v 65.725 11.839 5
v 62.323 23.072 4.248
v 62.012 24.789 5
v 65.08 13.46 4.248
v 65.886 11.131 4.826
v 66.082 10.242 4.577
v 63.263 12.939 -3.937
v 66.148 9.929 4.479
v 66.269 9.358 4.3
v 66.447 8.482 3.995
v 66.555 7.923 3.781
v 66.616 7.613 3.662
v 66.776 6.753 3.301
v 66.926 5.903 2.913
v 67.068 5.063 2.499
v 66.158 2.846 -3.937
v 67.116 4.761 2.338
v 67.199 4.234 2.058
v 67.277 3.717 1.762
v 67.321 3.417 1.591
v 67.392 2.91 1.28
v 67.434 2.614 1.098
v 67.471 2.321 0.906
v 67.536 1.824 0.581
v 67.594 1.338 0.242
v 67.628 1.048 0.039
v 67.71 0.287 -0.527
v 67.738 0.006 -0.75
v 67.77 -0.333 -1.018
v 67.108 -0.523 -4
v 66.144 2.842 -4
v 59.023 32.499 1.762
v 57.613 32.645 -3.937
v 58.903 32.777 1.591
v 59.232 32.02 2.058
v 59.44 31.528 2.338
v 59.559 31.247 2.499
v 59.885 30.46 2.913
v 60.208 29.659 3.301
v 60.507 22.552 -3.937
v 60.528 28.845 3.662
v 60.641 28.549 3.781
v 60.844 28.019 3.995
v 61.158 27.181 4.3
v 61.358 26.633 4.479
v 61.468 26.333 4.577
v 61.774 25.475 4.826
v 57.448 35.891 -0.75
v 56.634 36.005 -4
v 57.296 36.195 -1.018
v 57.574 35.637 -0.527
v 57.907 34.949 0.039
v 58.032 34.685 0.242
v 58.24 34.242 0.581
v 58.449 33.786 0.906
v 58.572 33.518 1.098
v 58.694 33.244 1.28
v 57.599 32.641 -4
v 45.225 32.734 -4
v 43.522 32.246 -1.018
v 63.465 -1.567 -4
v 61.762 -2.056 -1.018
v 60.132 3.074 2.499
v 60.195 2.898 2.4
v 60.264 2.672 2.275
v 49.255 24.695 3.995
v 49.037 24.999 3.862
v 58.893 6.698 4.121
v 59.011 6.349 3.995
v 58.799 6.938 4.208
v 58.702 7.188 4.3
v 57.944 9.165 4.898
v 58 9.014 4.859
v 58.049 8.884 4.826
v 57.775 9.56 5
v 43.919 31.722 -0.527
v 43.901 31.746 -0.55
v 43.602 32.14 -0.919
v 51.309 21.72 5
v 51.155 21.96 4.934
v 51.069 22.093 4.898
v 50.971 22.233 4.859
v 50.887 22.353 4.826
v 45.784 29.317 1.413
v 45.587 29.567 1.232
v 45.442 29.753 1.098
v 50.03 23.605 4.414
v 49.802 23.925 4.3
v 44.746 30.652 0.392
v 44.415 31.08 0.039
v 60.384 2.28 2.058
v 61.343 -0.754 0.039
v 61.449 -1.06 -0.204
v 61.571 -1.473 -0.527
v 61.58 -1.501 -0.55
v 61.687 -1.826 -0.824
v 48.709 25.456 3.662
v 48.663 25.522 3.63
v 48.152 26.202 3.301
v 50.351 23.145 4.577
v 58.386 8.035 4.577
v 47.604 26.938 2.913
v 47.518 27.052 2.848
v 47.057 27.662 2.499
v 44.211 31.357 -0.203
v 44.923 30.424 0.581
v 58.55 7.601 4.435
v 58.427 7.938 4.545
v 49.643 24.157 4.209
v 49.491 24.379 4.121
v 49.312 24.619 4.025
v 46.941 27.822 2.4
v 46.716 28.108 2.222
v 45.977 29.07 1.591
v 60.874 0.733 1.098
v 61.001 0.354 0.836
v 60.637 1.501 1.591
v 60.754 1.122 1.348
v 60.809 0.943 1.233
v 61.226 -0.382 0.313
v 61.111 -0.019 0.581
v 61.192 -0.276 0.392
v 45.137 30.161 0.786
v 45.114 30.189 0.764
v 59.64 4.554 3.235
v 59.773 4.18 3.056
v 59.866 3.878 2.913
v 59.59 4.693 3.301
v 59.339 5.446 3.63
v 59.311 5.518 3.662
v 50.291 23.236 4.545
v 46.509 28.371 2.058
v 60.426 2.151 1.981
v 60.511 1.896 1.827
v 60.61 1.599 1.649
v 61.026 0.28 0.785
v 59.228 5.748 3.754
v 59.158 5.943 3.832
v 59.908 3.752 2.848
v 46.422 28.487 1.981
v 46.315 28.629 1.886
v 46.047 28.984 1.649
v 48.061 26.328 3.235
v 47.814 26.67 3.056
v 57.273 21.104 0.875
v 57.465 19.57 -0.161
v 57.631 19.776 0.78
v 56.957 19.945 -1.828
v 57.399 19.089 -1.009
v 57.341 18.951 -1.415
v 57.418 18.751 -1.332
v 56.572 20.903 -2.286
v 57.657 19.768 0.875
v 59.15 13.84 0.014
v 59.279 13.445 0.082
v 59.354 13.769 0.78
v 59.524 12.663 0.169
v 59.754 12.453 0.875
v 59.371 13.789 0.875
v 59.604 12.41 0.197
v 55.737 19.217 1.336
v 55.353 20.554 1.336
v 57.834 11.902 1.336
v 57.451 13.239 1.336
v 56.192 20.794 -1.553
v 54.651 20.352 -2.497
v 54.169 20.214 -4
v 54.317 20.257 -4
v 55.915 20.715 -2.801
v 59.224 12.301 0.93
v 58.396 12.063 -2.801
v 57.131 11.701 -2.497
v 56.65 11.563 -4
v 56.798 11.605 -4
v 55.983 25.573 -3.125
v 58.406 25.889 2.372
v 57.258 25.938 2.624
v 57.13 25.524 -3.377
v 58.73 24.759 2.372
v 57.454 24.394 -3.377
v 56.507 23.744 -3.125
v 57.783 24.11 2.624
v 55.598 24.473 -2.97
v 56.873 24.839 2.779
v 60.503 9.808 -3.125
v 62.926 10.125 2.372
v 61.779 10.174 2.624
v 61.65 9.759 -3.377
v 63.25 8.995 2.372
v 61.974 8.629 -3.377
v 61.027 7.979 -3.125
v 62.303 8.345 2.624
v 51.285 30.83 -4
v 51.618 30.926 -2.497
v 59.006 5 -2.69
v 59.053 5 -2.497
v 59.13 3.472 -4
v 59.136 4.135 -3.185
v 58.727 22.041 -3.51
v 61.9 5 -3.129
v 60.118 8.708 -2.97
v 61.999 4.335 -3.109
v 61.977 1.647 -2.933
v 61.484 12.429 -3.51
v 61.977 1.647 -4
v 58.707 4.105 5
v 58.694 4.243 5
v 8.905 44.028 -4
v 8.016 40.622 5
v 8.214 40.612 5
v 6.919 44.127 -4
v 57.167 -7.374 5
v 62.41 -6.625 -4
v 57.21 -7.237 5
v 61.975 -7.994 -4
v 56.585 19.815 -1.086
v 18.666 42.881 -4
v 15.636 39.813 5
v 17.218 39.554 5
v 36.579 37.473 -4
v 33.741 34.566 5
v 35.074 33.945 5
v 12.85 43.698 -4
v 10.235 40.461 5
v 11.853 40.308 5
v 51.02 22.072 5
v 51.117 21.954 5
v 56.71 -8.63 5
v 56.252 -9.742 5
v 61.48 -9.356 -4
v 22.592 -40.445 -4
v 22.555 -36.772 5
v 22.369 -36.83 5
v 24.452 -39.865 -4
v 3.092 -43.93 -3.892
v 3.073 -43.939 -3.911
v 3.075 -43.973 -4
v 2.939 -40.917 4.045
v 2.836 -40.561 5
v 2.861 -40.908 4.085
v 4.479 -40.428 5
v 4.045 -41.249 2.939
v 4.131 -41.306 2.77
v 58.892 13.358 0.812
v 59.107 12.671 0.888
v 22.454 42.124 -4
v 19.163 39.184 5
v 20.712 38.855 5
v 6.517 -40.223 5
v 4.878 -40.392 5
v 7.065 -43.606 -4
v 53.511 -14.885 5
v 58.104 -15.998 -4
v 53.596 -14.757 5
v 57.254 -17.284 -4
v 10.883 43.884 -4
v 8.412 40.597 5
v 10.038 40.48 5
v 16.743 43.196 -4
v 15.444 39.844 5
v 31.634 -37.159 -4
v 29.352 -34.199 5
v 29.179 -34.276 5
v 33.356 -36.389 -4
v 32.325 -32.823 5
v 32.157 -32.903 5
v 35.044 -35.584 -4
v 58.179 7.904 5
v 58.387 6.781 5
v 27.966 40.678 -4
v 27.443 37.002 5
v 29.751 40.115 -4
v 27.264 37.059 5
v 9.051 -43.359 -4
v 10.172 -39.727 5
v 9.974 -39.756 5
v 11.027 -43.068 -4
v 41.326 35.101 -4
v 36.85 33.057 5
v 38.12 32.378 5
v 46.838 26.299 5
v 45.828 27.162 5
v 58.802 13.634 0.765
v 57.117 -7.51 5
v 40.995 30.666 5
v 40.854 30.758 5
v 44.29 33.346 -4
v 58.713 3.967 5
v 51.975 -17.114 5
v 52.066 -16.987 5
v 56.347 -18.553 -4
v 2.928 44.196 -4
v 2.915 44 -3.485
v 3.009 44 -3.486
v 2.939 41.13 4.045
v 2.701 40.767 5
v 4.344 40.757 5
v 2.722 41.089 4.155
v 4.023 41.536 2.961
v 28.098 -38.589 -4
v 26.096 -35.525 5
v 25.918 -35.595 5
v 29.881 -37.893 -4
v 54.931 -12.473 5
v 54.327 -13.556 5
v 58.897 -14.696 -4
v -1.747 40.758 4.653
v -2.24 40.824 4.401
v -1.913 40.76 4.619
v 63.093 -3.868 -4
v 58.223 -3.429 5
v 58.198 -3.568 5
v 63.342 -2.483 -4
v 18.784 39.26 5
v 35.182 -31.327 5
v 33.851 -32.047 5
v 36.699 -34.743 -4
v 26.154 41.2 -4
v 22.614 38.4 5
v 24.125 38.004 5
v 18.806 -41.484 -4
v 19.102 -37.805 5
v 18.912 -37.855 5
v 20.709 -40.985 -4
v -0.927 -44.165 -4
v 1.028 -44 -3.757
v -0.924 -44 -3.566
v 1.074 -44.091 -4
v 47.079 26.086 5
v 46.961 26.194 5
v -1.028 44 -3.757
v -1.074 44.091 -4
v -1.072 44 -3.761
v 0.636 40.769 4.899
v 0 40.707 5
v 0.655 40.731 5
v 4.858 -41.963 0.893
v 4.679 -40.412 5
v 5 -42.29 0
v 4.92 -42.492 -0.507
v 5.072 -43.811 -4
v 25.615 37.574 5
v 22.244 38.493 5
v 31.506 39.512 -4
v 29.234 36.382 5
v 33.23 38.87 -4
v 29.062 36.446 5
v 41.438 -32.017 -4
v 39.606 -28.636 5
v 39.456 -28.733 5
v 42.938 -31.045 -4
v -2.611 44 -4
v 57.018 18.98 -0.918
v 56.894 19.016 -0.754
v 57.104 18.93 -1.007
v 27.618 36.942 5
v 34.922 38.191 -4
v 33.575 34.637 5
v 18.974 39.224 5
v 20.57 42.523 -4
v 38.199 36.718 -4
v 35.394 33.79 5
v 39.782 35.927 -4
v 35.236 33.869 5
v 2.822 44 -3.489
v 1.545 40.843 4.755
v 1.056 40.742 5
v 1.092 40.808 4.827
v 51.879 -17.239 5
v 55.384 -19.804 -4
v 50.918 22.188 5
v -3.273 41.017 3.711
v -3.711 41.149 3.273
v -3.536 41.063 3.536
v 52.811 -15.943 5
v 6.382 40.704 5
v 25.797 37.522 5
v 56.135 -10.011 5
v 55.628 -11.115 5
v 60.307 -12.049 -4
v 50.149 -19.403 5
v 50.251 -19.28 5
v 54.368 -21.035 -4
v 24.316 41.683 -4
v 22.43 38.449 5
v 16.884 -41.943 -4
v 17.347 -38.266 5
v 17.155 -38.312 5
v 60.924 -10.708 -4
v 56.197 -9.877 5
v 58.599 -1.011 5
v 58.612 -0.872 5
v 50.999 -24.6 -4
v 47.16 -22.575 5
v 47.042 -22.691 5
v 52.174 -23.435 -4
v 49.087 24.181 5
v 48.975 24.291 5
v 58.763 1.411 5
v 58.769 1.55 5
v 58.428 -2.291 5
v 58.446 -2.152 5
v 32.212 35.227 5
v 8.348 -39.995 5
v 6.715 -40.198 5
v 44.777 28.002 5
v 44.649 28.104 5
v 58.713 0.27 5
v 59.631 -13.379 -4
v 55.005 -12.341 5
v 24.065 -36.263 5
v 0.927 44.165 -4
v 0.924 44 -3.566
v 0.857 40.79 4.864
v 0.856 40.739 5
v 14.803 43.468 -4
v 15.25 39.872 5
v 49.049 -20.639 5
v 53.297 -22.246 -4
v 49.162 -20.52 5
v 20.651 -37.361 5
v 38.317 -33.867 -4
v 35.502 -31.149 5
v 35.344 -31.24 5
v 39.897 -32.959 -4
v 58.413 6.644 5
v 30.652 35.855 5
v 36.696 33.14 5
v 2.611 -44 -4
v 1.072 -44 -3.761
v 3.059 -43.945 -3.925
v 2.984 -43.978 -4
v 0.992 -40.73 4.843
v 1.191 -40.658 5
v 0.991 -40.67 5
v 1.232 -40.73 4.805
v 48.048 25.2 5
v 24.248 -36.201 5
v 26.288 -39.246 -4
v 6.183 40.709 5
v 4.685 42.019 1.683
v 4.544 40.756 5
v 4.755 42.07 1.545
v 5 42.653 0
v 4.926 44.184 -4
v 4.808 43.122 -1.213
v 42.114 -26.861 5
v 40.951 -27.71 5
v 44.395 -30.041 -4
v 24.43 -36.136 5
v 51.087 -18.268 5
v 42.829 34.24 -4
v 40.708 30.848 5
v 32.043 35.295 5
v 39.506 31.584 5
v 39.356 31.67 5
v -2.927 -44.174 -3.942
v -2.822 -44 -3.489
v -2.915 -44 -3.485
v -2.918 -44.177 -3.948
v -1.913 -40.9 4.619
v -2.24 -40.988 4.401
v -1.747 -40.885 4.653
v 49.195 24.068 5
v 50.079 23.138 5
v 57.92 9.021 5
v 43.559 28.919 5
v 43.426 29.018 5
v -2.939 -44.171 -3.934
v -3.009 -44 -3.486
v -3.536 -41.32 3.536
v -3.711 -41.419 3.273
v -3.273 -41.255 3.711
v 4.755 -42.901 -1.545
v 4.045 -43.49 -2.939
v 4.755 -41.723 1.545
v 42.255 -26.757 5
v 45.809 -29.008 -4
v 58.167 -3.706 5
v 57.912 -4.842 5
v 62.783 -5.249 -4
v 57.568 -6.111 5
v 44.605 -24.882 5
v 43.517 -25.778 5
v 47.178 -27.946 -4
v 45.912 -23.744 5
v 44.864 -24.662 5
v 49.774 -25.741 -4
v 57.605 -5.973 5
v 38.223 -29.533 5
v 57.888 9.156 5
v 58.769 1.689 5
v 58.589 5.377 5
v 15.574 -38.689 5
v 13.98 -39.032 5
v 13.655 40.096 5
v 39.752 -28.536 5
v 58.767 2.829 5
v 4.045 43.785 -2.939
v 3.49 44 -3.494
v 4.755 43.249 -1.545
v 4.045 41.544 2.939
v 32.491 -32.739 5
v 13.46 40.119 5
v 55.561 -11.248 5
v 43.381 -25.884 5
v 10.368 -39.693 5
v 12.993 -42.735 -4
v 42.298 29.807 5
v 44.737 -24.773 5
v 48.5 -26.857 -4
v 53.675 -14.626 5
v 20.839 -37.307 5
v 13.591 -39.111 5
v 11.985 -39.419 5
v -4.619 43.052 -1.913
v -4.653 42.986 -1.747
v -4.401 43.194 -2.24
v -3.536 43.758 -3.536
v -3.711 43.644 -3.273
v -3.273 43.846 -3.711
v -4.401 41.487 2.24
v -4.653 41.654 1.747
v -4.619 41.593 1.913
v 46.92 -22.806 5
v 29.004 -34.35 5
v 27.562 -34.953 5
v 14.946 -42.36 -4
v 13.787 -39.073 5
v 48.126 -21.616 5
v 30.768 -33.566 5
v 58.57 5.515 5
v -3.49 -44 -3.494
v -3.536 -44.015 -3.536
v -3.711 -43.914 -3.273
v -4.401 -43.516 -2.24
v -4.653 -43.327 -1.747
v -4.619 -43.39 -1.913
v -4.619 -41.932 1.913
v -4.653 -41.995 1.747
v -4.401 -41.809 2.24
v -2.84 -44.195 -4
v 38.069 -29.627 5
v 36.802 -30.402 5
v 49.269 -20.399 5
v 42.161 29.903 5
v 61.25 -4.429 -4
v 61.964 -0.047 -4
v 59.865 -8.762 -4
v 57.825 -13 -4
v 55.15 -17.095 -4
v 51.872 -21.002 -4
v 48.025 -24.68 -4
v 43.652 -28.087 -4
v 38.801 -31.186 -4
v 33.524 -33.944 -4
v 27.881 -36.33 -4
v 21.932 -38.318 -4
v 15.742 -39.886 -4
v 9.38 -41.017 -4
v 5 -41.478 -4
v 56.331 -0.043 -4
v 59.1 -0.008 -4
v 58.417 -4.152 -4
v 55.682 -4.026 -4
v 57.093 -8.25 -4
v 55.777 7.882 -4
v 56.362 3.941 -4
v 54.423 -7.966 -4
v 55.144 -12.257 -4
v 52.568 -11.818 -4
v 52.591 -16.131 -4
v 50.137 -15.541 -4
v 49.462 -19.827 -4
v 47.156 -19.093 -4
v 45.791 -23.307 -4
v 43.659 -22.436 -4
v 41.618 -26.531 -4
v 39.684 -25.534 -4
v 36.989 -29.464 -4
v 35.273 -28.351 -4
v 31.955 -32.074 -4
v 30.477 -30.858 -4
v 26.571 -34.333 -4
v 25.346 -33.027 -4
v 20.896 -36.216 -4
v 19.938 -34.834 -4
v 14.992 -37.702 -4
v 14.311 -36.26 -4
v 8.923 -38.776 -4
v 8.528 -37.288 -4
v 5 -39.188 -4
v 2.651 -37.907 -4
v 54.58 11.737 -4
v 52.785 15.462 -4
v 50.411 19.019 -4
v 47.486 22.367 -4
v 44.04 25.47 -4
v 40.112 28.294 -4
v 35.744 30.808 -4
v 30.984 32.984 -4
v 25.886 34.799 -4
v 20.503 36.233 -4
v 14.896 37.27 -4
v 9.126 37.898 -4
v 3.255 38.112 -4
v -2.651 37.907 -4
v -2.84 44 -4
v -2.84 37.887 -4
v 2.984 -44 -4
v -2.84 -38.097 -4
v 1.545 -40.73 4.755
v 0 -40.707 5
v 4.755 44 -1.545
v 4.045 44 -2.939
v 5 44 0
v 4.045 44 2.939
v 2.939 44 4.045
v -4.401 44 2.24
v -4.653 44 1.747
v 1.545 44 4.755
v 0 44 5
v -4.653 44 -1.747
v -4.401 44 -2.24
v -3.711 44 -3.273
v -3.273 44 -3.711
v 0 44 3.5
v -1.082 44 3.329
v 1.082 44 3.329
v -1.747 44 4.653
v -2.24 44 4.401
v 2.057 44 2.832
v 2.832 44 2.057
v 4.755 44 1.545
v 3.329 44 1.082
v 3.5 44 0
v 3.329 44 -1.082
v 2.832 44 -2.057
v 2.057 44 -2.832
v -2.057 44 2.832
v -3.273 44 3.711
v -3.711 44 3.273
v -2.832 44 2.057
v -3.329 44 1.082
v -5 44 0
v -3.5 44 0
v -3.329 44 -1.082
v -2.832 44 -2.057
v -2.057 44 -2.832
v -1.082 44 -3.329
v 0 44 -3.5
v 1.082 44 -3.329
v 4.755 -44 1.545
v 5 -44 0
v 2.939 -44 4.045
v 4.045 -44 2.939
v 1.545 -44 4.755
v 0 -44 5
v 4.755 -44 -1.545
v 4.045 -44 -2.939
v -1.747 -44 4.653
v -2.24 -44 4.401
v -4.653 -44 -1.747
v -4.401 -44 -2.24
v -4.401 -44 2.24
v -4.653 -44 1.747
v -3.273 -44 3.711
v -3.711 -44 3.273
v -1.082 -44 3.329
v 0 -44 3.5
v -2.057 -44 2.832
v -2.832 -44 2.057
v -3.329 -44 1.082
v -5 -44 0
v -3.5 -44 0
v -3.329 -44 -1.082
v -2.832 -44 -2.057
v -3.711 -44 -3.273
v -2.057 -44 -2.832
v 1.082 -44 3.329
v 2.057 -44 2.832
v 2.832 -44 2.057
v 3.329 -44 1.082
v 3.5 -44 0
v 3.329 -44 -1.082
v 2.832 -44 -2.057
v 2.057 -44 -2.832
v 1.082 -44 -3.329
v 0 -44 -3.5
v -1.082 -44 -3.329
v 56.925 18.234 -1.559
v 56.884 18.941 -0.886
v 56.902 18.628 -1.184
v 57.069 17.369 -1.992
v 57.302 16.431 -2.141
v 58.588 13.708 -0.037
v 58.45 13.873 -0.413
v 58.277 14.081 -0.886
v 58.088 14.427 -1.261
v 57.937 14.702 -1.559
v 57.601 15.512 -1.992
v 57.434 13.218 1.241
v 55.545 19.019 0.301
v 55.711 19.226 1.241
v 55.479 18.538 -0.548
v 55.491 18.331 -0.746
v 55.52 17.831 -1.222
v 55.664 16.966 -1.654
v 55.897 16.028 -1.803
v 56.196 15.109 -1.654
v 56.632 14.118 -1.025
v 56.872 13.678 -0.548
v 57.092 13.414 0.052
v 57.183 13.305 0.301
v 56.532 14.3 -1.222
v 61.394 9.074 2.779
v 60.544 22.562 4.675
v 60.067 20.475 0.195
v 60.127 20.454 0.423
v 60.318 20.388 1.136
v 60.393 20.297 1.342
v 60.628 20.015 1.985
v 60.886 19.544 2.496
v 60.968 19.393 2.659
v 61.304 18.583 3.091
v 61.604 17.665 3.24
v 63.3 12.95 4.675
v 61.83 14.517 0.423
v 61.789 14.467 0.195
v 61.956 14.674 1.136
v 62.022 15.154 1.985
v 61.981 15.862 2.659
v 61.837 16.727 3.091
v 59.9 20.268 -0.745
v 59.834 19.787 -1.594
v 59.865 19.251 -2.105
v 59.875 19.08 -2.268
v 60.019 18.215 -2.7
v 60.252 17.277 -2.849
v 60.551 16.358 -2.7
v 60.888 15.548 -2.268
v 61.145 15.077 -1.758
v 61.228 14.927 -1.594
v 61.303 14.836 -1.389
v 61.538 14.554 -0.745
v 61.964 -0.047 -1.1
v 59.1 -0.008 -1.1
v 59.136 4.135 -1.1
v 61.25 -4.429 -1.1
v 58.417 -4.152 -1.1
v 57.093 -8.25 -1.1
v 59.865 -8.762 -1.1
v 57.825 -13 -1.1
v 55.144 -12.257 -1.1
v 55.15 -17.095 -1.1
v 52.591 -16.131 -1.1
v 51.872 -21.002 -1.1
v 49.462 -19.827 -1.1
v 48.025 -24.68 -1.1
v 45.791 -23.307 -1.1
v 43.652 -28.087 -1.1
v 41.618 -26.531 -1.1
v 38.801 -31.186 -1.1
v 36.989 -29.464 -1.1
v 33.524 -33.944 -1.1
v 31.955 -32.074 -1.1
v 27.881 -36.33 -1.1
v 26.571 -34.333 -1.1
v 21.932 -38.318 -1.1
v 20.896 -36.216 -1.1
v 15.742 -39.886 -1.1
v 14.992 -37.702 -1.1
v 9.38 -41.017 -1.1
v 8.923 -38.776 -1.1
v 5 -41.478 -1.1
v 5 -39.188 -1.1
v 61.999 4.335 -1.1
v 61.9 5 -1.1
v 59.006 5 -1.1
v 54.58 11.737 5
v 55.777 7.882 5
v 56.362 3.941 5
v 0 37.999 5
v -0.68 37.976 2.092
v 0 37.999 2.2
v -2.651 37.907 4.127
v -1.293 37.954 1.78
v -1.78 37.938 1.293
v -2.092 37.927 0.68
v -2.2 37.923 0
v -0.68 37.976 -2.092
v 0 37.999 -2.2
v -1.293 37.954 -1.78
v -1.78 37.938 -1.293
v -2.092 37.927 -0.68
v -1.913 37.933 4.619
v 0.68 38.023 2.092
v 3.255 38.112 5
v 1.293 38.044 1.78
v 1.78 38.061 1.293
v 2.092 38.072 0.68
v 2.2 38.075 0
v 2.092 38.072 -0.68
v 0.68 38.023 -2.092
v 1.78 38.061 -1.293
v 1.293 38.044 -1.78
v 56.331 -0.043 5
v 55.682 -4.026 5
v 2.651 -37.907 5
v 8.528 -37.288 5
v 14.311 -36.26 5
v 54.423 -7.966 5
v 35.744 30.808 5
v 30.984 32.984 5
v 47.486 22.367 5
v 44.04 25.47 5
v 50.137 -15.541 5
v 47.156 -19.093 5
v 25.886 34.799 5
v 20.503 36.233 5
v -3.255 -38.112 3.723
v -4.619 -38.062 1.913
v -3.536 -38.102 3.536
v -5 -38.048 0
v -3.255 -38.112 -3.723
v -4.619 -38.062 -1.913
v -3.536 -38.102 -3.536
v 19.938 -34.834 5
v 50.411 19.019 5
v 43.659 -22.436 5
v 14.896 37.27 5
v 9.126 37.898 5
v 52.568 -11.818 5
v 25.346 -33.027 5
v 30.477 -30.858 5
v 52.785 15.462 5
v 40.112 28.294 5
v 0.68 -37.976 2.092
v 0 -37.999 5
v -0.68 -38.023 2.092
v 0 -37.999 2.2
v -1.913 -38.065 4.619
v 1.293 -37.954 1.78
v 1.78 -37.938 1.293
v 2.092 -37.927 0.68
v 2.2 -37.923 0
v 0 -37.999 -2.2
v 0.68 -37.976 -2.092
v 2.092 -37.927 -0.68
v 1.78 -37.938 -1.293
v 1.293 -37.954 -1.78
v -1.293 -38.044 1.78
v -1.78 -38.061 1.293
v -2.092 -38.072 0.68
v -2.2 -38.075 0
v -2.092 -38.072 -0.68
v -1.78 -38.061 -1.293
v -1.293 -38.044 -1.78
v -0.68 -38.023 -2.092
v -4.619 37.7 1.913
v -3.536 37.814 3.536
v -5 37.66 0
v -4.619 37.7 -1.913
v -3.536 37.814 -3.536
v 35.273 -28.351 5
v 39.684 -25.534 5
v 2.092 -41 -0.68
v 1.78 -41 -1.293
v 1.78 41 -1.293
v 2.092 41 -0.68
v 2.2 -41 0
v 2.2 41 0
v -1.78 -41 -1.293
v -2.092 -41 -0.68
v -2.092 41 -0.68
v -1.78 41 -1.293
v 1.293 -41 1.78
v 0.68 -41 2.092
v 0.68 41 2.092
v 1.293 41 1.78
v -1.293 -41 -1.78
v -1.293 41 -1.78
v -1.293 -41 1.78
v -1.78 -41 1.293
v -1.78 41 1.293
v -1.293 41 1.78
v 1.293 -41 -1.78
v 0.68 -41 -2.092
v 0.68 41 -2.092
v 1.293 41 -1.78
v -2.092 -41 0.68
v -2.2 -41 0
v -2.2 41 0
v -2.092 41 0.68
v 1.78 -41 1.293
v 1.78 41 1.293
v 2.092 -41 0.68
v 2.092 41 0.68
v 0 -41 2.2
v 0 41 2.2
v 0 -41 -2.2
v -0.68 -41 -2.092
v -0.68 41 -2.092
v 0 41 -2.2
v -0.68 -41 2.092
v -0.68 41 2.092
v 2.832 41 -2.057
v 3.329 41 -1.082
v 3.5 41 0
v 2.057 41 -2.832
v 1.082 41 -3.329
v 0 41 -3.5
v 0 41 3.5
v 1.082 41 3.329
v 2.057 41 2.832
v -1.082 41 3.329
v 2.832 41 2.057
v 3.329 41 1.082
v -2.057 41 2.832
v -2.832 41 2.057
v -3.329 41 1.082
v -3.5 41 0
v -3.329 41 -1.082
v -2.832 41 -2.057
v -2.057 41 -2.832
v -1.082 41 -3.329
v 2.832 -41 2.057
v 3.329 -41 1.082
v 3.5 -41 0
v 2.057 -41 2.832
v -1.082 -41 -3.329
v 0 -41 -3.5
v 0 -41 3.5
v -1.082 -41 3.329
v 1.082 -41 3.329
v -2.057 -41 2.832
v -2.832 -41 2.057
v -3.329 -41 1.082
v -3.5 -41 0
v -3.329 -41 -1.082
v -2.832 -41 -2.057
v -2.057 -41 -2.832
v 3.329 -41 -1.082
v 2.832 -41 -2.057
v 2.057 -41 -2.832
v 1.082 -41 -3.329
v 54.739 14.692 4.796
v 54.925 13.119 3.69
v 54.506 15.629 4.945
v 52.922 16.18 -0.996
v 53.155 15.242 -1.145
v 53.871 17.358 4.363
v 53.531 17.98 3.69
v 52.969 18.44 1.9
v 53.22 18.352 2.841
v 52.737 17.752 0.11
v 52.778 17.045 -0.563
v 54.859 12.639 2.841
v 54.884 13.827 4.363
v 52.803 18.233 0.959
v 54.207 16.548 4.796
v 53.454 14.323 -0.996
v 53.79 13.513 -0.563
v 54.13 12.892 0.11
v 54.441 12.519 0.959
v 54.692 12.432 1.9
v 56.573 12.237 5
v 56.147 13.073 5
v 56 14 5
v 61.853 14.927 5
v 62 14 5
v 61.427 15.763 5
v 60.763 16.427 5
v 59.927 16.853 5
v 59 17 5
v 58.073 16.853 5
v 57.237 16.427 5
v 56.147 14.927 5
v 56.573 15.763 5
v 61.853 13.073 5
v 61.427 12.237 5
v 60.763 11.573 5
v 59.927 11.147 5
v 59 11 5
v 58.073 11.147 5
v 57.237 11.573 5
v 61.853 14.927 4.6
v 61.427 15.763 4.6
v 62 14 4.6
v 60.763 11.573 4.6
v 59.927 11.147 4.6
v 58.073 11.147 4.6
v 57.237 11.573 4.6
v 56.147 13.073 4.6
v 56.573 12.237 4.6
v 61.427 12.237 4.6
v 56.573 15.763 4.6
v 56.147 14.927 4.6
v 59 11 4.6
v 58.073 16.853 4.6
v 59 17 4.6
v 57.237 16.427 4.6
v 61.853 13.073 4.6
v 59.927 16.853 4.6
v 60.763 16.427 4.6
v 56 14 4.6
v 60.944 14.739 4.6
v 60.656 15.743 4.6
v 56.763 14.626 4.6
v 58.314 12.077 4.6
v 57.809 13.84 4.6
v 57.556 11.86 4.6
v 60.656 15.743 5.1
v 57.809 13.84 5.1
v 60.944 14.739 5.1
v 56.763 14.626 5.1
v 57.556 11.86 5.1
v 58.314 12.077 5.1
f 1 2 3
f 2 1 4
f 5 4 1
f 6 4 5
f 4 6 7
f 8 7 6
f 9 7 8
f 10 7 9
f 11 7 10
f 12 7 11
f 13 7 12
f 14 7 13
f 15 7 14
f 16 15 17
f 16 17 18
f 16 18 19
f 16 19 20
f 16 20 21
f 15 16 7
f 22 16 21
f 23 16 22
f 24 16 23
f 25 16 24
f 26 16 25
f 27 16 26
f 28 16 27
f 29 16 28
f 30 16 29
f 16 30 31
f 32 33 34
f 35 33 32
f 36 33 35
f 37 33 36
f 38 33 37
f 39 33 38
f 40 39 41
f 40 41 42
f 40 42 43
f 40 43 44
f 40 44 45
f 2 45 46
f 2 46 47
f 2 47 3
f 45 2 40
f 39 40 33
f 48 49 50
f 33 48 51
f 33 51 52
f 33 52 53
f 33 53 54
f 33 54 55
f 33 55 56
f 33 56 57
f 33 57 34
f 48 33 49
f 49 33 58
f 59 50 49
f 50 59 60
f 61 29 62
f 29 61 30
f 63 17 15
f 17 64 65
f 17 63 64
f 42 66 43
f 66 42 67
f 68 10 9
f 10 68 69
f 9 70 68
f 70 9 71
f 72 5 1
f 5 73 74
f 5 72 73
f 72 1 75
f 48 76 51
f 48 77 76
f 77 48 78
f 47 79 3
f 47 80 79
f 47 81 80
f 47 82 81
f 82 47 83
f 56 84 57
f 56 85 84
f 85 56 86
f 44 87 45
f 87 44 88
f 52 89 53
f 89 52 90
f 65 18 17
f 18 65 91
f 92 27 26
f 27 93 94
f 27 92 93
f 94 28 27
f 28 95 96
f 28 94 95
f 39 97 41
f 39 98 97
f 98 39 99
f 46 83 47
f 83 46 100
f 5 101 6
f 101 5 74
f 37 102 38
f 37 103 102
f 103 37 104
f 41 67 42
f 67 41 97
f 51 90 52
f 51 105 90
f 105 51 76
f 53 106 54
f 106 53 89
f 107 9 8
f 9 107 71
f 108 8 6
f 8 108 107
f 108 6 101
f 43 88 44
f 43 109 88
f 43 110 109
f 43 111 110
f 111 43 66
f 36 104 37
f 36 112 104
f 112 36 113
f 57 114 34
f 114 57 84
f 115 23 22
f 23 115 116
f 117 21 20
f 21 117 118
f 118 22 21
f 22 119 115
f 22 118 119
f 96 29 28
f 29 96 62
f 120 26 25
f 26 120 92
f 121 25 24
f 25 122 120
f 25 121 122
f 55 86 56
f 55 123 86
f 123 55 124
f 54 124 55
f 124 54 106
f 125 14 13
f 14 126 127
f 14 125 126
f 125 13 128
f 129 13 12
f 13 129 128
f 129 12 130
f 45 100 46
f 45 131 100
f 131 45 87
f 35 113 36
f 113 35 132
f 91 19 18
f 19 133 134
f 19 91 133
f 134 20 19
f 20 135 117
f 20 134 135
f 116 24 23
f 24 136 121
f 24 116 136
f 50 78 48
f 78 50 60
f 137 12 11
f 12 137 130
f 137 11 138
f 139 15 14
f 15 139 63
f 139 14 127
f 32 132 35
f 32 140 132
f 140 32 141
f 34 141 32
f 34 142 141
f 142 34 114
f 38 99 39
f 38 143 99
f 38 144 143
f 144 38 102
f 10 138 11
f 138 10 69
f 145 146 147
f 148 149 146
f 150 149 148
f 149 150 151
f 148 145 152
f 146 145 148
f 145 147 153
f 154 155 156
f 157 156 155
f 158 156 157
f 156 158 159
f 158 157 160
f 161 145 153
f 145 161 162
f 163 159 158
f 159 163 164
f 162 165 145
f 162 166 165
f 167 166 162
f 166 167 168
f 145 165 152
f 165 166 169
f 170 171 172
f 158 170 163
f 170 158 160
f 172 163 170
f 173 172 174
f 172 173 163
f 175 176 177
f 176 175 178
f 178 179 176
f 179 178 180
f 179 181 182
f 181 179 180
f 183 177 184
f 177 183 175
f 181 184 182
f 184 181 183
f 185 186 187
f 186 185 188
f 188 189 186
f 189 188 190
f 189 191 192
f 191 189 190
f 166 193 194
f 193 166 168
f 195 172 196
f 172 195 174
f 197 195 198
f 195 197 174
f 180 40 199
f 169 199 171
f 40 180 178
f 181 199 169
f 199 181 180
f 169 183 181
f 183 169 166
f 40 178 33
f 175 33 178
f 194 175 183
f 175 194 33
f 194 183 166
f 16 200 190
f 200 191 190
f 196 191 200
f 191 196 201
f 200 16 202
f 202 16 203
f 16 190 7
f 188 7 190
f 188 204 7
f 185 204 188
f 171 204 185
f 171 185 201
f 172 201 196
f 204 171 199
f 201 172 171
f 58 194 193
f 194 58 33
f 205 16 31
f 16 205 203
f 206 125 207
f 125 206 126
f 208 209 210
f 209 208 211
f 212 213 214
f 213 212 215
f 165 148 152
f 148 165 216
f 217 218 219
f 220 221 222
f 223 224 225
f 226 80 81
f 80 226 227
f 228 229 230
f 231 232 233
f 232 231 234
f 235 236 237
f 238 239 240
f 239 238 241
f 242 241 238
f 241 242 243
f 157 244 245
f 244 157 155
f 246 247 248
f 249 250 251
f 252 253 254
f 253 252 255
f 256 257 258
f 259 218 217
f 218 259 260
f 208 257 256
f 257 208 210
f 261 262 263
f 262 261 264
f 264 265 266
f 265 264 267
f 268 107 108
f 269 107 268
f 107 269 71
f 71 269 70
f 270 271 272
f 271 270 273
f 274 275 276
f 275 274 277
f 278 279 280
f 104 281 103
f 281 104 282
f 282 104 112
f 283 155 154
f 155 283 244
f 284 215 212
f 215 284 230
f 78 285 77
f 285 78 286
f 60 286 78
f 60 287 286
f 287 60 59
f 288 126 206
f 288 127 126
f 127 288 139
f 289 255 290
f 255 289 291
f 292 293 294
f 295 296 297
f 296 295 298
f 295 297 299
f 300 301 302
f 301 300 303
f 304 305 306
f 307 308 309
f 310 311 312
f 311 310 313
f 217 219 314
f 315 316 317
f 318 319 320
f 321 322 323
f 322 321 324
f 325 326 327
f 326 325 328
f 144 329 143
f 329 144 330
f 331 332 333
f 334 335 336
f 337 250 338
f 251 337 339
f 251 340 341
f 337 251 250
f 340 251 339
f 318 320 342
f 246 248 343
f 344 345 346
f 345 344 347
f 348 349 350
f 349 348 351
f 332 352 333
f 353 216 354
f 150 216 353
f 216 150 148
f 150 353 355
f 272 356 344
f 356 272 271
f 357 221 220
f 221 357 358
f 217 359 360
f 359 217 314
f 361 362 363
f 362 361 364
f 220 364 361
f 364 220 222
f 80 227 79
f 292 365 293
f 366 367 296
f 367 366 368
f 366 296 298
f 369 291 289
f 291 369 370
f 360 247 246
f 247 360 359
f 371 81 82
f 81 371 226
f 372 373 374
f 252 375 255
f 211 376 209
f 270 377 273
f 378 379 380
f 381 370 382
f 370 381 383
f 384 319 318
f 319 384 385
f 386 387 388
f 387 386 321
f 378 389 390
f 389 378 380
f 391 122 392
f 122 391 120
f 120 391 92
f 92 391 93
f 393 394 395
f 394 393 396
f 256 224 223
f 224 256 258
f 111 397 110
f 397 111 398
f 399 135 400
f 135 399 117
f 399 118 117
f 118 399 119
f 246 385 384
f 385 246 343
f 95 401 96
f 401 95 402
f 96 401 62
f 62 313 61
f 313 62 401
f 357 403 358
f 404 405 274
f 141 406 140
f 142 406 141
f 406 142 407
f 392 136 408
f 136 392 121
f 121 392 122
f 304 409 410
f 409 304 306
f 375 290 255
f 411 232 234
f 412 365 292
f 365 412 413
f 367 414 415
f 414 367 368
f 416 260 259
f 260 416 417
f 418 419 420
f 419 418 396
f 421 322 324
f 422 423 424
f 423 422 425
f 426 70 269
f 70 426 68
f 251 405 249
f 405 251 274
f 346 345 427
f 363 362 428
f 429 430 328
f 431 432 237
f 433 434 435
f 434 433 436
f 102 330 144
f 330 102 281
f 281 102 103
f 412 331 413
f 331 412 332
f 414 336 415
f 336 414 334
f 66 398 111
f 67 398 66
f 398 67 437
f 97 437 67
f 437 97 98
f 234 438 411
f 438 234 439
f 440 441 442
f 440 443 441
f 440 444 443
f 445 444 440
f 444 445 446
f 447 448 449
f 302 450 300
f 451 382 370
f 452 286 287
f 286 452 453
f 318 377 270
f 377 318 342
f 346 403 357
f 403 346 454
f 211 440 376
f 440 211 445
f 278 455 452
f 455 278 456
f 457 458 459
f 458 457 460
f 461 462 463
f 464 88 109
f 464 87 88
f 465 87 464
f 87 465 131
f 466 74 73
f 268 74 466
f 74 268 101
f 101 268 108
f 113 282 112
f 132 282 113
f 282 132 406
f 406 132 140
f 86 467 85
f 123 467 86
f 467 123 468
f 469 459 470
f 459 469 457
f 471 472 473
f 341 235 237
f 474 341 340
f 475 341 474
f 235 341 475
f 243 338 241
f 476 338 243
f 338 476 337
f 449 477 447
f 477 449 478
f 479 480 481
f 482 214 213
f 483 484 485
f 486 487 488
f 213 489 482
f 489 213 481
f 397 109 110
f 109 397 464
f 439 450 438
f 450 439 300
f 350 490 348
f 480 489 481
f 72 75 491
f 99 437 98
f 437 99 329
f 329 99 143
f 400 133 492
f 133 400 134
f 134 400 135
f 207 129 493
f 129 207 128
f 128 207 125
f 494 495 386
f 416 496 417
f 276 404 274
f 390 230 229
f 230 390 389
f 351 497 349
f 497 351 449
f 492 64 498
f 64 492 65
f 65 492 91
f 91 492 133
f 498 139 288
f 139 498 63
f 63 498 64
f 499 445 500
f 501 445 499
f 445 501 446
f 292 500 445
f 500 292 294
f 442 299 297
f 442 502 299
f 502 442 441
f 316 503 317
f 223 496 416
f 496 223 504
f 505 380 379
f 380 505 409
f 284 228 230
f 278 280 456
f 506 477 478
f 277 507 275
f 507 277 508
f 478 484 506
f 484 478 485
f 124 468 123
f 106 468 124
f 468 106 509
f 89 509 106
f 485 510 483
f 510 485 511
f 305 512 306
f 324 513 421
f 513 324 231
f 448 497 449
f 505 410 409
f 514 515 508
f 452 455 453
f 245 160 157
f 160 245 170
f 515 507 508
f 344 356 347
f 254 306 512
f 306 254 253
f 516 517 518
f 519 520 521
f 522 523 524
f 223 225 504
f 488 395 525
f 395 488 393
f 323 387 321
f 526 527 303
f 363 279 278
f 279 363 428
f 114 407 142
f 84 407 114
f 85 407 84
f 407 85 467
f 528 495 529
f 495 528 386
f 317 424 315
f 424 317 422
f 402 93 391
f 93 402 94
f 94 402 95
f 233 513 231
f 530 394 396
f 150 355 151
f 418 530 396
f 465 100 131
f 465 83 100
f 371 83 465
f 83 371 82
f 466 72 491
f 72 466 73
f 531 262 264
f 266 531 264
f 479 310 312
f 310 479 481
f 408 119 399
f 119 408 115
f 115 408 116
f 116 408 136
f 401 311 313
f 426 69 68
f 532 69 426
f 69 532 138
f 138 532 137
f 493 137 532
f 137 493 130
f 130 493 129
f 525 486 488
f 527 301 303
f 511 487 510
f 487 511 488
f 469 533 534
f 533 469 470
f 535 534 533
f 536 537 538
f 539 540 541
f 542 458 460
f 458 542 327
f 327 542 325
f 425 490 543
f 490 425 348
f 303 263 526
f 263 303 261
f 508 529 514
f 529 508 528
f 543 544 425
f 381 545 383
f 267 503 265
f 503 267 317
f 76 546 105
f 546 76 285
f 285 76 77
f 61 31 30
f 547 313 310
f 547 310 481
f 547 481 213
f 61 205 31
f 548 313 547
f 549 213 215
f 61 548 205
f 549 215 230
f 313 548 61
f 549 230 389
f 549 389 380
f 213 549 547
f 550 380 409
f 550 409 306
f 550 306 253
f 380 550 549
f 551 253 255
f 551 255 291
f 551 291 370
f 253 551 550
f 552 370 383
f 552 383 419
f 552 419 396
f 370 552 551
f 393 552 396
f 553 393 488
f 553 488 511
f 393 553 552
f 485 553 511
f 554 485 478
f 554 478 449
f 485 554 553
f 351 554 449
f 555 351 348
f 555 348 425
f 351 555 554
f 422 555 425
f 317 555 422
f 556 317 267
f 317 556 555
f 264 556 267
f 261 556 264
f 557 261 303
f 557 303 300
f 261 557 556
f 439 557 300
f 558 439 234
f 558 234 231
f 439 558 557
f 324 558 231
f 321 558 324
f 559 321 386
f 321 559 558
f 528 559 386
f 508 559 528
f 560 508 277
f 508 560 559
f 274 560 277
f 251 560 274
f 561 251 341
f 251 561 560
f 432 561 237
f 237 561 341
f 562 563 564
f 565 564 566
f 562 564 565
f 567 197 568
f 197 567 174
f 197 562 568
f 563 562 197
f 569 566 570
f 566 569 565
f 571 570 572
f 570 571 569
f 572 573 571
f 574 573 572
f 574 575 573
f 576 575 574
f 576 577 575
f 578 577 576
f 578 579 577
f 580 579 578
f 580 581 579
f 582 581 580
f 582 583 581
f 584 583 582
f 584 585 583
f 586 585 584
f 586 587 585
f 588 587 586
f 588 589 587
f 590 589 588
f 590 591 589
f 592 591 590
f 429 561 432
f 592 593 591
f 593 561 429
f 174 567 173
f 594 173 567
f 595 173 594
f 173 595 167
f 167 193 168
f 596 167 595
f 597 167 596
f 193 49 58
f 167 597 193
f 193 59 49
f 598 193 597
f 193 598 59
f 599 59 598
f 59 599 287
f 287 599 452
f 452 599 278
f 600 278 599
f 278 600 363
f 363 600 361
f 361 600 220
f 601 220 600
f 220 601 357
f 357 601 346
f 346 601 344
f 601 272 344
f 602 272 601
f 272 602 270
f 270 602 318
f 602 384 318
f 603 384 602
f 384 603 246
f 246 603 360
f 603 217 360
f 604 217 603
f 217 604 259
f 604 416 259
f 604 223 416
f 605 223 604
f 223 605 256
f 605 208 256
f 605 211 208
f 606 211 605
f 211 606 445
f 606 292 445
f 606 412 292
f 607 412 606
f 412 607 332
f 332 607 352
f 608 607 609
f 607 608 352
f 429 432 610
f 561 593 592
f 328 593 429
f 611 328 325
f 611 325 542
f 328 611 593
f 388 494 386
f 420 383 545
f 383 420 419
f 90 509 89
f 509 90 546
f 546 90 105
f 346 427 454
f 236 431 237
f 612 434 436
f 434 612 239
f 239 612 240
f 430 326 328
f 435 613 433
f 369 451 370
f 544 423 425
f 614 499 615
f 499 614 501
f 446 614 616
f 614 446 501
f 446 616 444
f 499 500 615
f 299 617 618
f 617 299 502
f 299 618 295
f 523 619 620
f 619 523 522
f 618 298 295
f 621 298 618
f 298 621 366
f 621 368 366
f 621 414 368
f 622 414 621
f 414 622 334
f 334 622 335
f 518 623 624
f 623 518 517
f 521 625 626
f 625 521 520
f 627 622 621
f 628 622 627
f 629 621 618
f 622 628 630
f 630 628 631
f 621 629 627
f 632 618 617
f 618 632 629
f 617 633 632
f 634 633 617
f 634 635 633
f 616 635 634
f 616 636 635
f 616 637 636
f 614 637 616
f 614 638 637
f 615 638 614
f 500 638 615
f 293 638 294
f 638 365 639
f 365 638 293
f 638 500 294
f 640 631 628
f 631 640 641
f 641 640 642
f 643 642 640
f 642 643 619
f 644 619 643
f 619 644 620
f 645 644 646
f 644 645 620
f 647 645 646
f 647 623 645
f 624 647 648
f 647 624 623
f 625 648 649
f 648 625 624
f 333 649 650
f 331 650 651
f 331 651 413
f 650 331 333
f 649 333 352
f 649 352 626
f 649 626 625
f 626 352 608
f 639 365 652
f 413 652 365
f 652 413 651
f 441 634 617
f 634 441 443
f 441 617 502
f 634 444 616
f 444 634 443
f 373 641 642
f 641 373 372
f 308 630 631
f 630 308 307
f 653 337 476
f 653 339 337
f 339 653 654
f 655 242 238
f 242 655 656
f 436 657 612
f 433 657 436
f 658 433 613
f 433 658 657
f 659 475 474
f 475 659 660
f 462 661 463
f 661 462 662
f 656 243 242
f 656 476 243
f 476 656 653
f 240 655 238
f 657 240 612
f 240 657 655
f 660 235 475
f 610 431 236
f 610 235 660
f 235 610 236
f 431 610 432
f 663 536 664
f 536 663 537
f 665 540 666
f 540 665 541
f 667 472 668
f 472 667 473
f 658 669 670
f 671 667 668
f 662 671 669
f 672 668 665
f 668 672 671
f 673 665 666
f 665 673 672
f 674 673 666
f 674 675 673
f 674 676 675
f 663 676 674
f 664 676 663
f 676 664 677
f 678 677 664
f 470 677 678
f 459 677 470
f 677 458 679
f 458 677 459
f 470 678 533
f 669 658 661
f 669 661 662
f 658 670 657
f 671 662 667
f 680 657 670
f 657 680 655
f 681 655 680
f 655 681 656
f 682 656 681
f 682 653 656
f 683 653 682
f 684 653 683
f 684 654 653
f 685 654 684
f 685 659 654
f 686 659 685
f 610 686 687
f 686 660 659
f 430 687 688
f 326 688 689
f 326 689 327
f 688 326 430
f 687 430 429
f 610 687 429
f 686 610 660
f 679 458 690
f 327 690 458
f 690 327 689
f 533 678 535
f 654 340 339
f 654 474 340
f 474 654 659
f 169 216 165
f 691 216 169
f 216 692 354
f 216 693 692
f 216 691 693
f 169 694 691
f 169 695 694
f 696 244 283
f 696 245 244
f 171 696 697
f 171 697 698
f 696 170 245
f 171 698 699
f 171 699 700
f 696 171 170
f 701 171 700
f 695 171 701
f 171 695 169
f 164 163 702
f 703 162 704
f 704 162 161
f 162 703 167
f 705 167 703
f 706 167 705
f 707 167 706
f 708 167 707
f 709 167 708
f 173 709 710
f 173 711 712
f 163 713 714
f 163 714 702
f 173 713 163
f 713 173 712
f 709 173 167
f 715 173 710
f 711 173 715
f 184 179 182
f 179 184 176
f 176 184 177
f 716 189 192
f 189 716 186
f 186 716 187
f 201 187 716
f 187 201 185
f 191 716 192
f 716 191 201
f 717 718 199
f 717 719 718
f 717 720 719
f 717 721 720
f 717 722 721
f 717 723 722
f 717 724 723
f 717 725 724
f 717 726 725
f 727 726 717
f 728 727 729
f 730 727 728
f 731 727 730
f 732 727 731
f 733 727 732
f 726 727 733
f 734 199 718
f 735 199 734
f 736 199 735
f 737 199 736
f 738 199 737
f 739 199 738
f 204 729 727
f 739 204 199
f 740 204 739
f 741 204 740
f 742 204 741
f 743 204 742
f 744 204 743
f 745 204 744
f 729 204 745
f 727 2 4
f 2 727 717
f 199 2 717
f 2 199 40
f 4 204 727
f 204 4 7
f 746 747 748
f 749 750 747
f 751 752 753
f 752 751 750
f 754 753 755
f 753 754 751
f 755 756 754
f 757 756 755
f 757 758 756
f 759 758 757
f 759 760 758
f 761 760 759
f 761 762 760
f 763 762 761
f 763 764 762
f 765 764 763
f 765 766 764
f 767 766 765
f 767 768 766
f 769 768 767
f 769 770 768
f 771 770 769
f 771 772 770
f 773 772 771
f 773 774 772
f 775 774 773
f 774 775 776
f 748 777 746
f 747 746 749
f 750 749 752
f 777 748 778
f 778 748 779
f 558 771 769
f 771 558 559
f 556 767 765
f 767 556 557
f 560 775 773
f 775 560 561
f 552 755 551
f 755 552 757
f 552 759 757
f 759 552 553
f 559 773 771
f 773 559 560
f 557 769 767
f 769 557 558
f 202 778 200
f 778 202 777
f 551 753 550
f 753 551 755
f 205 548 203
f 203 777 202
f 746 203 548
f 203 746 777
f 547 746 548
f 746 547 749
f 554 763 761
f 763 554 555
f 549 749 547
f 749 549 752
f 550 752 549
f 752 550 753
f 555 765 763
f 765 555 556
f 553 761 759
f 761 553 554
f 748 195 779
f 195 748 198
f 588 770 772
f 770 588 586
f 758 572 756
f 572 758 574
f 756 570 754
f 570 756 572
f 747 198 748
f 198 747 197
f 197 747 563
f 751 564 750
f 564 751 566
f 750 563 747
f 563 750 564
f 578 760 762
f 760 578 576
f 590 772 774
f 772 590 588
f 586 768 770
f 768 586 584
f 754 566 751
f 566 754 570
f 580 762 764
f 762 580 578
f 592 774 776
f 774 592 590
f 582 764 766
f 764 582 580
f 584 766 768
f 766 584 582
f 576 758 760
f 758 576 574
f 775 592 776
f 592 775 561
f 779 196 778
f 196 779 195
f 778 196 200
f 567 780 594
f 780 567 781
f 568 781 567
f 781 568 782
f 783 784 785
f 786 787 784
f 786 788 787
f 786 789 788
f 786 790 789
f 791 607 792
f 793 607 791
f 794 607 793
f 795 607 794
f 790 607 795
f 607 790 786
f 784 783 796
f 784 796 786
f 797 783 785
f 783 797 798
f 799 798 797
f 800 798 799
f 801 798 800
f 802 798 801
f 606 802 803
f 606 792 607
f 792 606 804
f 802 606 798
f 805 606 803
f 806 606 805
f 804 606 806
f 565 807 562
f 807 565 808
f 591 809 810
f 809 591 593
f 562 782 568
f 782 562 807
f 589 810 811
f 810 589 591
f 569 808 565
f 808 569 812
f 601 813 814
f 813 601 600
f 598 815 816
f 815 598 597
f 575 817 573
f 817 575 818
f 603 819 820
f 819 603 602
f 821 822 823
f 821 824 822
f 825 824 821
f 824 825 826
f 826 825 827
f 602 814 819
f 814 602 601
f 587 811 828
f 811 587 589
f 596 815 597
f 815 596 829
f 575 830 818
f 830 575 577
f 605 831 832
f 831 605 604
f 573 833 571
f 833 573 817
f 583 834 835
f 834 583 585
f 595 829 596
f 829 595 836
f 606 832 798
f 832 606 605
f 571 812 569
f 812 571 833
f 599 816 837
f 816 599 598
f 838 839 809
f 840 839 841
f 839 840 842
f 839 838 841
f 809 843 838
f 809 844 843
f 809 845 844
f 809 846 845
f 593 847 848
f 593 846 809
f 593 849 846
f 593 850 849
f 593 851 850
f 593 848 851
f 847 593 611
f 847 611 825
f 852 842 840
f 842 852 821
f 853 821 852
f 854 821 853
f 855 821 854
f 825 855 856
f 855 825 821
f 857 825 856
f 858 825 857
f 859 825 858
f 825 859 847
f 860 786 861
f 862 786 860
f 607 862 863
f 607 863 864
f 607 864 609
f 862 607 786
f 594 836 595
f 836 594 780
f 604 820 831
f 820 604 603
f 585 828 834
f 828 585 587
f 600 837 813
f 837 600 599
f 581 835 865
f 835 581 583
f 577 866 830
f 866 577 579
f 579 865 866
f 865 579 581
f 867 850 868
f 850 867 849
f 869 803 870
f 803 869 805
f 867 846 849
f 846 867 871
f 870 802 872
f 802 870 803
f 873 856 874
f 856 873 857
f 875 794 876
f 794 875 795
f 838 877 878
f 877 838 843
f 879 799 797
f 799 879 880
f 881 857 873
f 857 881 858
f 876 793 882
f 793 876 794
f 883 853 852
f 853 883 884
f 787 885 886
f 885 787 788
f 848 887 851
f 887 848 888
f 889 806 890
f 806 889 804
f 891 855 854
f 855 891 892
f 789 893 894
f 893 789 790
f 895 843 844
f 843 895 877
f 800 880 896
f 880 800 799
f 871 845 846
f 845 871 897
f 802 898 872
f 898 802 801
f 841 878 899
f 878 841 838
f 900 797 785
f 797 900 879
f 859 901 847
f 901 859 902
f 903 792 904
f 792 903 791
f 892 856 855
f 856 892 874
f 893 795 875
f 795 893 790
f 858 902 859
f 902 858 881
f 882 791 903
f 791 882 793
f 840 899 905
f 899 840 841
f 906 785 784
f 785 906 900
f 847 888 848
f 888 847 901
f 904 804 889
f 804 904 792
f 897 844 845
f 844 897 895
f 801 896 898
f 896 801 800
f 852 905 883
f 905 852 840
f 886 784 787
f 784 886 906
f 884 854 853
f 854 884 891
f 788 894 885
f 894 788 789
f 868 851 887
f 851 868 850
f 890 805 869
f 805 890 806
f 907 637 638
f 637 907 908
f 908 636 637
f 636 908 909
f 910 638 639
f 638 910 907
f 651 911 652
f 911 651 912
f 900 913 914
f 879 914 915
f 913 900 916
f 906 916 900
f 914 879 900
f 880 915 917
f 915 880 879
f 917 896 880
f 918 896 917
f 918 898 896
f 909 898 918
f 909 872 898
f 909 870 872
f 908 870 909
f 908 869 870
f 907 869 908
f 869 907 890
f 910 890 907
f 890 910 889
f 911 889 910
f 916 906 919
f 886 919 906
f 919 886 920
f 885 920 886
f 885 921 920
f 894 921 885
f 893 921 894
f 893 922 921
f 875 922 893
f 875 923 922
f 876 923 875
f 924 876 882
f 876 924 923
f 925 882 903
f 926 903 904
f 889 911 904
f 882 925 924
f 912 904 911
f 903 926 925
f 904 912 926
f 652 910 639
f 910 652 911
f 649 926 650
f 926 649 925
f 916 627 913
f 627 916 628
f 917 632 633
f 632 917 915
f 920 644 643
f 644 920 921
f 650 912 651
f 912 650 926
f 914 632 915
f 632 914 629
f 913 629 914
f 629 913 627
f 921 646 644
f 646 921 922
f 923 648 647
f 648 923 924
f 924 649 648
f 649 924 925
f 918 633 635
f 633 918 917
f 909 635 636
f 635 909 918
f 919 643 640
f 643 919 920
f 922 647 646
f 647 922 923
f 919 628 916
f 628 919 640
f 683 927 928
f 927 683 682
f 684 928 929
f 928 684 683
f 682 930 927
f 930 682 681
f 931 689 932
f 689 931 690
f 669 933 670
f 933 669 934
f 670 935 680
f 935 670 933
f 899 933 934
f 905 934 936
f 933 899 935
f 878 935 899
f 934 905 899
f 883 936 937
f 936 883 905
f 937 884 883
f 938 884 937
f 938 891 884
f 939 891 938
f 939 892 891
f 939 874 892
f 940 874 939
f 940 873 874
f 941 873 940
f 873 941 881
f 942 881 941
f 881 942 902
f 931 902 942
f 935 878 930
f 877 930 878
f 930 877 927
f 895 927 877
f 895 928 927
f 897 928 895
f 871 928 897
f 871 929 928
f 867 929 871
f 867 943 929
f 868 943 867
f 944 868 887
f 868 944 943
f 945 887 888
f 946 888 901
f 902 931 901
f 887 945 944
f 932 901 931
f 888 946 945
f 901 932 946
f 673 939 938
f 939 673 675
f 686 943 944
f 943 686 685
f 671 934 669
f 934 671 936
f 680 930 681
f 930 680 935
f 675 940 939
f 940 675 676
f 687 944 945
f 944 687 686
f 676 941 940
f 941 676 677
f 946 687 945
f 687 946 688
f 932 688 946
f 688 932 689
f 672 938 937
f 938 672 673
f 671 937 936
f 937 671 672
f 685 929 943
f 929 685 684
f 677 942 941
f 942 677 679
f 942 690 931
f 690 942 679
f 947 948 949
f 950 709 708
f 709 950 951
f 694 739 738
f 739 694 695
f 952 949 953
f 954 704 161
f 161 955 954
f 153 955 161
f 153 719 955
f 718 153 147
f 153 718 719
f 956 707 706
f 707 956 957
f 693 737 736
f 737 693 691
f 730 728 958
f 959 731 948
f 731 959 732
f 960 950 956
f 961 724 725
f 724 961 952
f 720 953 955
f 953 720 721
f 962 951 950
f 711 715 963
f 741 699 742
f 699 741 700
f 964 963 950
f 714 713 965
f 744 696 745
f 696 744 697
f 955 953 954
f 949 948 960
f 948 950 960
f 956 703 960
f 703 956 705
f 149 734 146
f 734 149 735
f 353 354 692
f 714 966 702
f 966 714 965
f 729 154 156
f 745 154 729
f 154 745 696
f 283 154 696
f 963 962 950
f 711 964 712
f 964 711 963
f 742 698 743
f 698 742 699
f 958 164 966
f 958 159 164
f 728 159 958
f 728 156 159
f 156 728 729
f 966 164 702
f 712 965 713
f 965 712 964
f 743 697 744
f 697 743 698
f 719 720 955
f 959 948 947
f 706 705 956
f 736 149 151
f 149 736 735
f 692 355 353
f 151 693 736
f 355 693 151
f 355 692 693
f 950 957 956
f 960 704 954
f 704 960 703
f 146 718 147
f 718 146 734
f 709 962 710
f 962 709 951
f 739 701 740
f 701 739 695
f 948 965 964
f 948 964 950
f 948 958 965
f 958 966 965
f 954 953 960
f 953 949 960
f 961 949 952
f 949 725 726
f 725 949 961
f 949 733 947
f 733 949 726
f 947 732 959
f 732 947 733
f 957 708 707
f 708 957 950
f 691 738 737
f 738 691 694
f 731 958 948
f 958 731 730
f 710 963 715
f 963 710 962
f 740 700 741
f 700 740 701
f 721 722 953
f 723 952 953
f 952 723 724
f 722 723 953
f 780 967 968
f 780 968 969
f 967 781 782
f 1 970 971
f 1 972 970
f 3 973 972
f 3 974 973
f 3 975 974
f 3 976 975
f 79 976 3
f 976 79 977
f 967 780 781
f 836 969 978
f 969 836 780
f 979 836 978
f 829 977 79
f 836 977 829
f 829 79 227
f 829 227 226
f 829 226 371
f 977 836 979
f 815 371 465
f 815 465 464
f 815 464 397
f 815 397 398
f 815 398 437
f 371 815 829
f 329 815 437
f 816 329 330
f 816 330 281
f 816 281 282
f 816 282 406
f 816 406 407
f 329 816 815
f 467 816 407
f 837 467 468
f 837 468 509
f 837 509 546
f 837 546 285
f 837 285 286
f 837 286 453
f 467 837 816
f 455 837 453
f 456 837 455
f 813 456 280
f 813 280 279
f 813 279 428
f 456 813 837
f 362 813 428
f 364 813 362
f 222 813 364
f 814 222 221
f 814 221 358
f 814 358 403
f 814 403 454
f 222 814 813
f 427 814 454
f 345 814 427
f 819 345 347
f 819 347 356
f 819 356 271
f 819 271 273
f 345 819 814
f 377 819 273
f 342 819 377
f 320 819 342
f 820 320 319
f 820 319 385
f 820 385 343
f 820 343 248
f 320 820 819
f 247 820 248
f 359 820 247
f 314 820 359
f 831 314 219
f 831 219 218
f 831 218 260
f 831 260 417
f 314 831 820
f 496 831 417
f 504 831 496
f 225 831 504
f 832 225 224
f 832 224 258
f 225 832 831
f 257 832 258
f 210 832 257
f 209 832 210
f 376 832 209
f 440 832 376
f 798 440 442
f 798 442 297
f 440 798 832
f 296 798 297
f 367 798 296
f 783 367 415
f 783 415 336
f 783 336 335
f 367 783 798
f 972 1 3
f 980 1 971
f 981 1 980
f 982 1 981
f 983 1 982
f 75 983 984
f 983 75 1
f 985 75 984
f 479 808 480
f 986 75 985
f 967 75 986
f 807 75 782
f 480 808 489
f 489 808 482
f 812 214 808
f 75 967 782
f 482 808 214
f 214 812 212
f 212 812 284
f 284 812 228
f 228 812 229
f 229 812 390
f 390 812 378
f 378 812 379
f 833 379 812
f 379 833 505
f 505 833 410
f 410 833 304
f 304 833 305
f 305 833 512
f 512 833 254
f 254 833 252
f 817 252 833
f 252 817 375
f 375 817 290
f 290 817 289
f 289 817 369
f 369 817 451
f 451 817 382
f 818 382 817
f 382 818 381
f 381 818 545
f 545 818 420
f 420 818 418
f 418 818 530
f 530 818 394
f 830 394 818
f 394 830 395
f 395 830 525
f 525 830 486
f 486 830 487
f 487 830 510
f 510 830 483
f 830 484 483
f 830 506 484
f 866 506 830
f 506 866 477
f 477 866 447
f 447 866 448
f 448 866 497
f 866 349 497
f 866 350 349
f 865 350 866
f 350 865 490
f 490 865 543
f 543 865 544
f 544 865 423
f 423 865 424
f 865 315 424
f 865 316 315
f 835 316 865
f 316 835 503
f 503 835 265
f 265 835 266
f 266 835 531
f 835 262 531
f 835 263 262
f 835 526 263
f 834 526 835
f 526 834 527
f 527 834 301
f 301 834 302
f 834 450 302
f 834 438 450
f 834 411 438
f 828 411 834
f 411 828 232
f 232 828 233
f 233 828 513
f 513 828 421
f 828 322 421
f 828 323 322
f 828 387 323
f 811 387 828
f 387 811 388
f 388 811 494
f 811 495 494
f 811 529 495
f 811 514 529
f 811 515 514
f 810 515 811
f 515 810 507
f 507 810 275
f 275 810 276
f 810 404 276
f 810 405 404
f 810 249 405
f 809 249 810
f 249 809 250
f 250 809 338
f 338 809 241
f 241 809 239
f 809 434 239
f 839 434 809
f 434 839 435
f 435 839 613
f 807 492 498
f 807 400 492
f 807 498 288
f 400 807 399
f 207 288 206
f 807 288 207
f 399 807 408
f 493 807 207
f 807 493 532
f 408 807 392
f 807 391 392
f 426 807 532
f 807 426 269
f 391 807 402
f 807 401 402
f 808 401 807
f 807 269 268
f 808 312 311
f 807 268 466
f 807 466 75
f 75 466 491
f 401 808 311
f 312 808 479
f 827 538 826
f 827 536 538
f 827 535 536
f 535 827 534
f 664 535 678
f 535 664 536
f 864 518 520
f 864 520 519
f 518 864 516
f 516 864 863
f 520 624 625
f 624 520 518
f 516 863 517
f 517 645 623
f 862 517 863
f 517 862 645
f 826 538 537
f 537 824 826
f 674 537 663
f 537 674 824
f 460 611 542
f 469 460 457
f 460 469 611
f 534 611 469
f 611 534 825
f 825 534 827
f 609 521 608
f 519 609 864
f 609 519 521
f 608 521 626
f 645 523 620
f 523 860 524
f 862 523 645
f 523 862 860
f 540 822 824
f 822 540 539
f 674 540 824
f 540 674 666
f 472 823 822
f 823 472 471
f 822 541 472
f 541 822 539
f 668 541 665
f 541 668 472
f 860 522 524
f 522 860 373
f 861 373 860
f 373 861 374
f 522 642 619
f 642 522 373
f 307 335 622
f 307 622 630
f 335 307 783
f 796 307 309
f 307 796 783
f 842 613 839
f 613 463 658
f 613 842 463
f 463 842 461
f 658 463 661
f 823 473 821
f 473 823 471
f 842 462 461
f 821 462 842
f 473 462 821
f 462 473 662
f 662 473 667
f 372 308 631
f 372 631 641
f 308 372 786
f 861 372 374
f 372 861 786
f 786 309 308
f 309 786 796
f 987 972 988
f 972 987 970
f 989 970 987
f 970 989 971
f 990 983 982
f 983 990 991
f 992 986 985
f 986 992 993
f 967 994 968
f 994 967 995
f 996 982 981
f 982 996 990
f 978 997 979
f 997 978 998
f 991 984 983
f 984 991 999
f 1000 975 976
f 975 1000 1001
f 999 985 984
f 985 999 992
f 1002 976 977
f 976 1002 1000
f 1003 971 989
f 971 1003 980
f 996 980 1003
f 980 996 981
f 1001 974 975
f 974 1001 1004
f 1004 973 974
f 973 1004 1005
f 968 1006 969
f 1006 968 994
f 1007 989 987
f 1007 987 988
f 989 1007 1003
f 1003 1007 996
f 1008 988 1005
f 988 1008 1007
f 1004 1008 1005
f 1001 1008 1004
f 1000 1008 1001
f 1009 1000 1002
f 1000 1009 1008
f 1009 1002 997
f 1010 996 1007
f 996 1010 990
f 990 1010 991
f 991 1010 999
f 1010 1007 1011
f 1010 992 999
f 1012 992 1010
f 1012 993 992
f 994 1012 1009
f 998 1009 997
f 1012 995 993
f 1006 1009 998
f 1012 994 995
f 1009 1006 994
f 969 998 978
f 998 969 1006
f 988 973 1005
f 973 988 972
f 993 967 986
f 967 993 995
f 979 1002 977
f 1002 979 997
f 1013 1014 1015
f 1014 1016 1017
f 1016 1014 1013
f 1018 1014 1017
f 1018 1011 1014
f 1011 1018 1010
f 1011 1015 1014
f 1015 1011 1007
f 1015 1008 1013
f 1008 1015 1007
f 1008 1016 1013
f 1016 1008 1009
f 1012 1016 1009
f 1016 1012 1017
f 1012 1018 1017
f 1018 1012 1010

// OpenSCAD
module ausine() {
    rotate([0, 0, 16]) translate([63, 0, 2]) rotate([0, 103, 0]) cylinder(r=6.25/2, h=10, $fn=20);

    translate([0, -42, 0]) rotate([-90, 0, 0]) cylinder(r=2.06, h=84, $fn=20);

    %translate([0, 0, -15]) rotate([0, 0, 4]) scale([1, 0.75, 1]) cylinder(r=50, h=20);
}

module block() {
    difference() {
        intersection() {
            cube([15, 38, 25]);
            translate([36, 19, 0]) rotate([0, -13, 0]) cylinder(r=30, h=50, $fn=200);
        }
        translate([15/2, 38/2, 25]) {
            
            // Plate slot
            translate([-2, -4.5, -6]) cube([10, 9, 1.5]);
            
            // Screw holes
            translate([0, 16.4/2, -3.3]) rotate([0, 90, 0]) cylinder(r=1, h=10);
            translate([0, -16.4/2, -3.3]) rotate([0, 90, 0]) cylinder(r=1, h=10);

            // Indent for the plate
            translate([1.9, -31/2, -6.4]) cube([10, 31, 6.4]);
        }
    }
}


module yoke() {
    intersection() {
        // Envelope with rounded end at the screws
        hull() {
            translate([0, -75, 0]) rotate([-90, 0, 0])cylinder(r=5, h=150);
            translate([100, -75, -5]) cube([10, 150, 10]);
        }
    difference() {
        union () {
        rotate([0, 0, 4]) translate([0, 0, -4]) 
            rotate([0, 0, 0]) scale([1.10, 0.76, 1]) cylinder(r1=58, r2=53, h=10, $fn=200);
            translate([0, 38, 0]) rotate([-90, 0, 0]) cylinder(r=5, h=6, $fn=20);
            translate([0, -38, 0]) rotate([90, 0, 0]) cylinder(r=5, h=6, $fn=20);
            
            // Mounting block
            rotate([0, 0, 16]) translate([56, 0, 2]) rotate([0, 103, 0]) translate([-5.5, -19, 9.5-25]) block();
        }
        
        // Inner ellipsoid
        rotate([0, 0, 4]) translate([0, 0, -25]) 
            scale([1.13, 0.76, 1]) cylinder(r=50, h=50, $fn=60);
        translate([0, -42, 0]) rotate([-90, 0, 0]) cylinder(r=2.2, h=84, $fn=20);

        // Screw holes
        translate([0, 41, 0]) rotate([-90, 0, 0]) cylinder(r=3.5, h=10, $fn=20);
        translate([0, -41, 0]) rotate([90, 0, 0]) cylinder(r=3.5, h=10, $fn=20);

        // Axle
        rotate([0, 0, 16]) translate([56, 0, 1.9]) rotate([0, 103, 0]) cylinder(r=6.25/2, h=10, $fn=20);
        // Bottom
        translate([-75, -75, -150-4]) cube([150, 150, 150]);
        // Top
        translate([-75, -75, 6]) cube([150, 150, 150]);

        // Block holes (again)
        rotate([0, 0, 16]) translate([56, 0, 2]) rotate([0, 103, 0]) translate([-5.5, -19, 9.5-25])translate([15/2, 38/2, 25]) {
            
            // Plate slot
            translate([-2, -4.5, -5.8-1.5/2]) cube([10, 9, 1.5]);
            
            // Screw holes
            translate([-4, 16.4/2, -3.3]) rotate([0, 90, 0]) cylinder(r=1, h=10);
            translate([-4, -16.4/2, -3.3]) rotate([0, 90, 0]) cylinder(r=1, h=10);

            // Indent for the plate
            translate([1.9, -31/2, -6.4]) cube([10, 31, 6.4]);
            
            //Square indent
            translate([-1.5-5, -5, -1.9])cube([10, 10, 2]);
        }
        
      // Wire channel
      intersection () {
          difference() {
            rotate([0, 0, 4]) translate([0, 0, -4.1]) 
                scale([1.13, 0.76, 1]) cylinder(r=55, h=3, $fn=60);
            rotate([0, 0, 4]) translate([0, 0, -25]) 
                scale([1.14, 0.76, 1]) cylinder(r=52, h=50, $fn=60);
          }
          translate([5, -95, -6]) cube([100, 100, 10]);
      }
    }}
}

module yoke_l() {
    difference() {
        yoke();
        translate([59, 14, 4.6])cylinder(r=3, h=1, $fn=20);
    }
    translate([59, 14, 4.6]) rotate([0, 0, 16-90]) 
        linear_extrude(height=0.5) text("L", size=4, font="DejaVu Sans:style=Bold", halign="center", valign="center");
}
module yoke_r() {
    difference() {
        mirror([0, 1, 0]) yoke();
        translate([59, -14, 4.6])cylinder(r=3, h=1, $fn=20);
    }
    translate([59, -14, 4.6]) rotate([0, 0, -16-90]) 
        linear_extrude(height=0.5) text("R", size=4, font="DejaVu Sans:style=Bold", halign="center", valign="center");
}
%ausine();
yoke_l();
//block();
